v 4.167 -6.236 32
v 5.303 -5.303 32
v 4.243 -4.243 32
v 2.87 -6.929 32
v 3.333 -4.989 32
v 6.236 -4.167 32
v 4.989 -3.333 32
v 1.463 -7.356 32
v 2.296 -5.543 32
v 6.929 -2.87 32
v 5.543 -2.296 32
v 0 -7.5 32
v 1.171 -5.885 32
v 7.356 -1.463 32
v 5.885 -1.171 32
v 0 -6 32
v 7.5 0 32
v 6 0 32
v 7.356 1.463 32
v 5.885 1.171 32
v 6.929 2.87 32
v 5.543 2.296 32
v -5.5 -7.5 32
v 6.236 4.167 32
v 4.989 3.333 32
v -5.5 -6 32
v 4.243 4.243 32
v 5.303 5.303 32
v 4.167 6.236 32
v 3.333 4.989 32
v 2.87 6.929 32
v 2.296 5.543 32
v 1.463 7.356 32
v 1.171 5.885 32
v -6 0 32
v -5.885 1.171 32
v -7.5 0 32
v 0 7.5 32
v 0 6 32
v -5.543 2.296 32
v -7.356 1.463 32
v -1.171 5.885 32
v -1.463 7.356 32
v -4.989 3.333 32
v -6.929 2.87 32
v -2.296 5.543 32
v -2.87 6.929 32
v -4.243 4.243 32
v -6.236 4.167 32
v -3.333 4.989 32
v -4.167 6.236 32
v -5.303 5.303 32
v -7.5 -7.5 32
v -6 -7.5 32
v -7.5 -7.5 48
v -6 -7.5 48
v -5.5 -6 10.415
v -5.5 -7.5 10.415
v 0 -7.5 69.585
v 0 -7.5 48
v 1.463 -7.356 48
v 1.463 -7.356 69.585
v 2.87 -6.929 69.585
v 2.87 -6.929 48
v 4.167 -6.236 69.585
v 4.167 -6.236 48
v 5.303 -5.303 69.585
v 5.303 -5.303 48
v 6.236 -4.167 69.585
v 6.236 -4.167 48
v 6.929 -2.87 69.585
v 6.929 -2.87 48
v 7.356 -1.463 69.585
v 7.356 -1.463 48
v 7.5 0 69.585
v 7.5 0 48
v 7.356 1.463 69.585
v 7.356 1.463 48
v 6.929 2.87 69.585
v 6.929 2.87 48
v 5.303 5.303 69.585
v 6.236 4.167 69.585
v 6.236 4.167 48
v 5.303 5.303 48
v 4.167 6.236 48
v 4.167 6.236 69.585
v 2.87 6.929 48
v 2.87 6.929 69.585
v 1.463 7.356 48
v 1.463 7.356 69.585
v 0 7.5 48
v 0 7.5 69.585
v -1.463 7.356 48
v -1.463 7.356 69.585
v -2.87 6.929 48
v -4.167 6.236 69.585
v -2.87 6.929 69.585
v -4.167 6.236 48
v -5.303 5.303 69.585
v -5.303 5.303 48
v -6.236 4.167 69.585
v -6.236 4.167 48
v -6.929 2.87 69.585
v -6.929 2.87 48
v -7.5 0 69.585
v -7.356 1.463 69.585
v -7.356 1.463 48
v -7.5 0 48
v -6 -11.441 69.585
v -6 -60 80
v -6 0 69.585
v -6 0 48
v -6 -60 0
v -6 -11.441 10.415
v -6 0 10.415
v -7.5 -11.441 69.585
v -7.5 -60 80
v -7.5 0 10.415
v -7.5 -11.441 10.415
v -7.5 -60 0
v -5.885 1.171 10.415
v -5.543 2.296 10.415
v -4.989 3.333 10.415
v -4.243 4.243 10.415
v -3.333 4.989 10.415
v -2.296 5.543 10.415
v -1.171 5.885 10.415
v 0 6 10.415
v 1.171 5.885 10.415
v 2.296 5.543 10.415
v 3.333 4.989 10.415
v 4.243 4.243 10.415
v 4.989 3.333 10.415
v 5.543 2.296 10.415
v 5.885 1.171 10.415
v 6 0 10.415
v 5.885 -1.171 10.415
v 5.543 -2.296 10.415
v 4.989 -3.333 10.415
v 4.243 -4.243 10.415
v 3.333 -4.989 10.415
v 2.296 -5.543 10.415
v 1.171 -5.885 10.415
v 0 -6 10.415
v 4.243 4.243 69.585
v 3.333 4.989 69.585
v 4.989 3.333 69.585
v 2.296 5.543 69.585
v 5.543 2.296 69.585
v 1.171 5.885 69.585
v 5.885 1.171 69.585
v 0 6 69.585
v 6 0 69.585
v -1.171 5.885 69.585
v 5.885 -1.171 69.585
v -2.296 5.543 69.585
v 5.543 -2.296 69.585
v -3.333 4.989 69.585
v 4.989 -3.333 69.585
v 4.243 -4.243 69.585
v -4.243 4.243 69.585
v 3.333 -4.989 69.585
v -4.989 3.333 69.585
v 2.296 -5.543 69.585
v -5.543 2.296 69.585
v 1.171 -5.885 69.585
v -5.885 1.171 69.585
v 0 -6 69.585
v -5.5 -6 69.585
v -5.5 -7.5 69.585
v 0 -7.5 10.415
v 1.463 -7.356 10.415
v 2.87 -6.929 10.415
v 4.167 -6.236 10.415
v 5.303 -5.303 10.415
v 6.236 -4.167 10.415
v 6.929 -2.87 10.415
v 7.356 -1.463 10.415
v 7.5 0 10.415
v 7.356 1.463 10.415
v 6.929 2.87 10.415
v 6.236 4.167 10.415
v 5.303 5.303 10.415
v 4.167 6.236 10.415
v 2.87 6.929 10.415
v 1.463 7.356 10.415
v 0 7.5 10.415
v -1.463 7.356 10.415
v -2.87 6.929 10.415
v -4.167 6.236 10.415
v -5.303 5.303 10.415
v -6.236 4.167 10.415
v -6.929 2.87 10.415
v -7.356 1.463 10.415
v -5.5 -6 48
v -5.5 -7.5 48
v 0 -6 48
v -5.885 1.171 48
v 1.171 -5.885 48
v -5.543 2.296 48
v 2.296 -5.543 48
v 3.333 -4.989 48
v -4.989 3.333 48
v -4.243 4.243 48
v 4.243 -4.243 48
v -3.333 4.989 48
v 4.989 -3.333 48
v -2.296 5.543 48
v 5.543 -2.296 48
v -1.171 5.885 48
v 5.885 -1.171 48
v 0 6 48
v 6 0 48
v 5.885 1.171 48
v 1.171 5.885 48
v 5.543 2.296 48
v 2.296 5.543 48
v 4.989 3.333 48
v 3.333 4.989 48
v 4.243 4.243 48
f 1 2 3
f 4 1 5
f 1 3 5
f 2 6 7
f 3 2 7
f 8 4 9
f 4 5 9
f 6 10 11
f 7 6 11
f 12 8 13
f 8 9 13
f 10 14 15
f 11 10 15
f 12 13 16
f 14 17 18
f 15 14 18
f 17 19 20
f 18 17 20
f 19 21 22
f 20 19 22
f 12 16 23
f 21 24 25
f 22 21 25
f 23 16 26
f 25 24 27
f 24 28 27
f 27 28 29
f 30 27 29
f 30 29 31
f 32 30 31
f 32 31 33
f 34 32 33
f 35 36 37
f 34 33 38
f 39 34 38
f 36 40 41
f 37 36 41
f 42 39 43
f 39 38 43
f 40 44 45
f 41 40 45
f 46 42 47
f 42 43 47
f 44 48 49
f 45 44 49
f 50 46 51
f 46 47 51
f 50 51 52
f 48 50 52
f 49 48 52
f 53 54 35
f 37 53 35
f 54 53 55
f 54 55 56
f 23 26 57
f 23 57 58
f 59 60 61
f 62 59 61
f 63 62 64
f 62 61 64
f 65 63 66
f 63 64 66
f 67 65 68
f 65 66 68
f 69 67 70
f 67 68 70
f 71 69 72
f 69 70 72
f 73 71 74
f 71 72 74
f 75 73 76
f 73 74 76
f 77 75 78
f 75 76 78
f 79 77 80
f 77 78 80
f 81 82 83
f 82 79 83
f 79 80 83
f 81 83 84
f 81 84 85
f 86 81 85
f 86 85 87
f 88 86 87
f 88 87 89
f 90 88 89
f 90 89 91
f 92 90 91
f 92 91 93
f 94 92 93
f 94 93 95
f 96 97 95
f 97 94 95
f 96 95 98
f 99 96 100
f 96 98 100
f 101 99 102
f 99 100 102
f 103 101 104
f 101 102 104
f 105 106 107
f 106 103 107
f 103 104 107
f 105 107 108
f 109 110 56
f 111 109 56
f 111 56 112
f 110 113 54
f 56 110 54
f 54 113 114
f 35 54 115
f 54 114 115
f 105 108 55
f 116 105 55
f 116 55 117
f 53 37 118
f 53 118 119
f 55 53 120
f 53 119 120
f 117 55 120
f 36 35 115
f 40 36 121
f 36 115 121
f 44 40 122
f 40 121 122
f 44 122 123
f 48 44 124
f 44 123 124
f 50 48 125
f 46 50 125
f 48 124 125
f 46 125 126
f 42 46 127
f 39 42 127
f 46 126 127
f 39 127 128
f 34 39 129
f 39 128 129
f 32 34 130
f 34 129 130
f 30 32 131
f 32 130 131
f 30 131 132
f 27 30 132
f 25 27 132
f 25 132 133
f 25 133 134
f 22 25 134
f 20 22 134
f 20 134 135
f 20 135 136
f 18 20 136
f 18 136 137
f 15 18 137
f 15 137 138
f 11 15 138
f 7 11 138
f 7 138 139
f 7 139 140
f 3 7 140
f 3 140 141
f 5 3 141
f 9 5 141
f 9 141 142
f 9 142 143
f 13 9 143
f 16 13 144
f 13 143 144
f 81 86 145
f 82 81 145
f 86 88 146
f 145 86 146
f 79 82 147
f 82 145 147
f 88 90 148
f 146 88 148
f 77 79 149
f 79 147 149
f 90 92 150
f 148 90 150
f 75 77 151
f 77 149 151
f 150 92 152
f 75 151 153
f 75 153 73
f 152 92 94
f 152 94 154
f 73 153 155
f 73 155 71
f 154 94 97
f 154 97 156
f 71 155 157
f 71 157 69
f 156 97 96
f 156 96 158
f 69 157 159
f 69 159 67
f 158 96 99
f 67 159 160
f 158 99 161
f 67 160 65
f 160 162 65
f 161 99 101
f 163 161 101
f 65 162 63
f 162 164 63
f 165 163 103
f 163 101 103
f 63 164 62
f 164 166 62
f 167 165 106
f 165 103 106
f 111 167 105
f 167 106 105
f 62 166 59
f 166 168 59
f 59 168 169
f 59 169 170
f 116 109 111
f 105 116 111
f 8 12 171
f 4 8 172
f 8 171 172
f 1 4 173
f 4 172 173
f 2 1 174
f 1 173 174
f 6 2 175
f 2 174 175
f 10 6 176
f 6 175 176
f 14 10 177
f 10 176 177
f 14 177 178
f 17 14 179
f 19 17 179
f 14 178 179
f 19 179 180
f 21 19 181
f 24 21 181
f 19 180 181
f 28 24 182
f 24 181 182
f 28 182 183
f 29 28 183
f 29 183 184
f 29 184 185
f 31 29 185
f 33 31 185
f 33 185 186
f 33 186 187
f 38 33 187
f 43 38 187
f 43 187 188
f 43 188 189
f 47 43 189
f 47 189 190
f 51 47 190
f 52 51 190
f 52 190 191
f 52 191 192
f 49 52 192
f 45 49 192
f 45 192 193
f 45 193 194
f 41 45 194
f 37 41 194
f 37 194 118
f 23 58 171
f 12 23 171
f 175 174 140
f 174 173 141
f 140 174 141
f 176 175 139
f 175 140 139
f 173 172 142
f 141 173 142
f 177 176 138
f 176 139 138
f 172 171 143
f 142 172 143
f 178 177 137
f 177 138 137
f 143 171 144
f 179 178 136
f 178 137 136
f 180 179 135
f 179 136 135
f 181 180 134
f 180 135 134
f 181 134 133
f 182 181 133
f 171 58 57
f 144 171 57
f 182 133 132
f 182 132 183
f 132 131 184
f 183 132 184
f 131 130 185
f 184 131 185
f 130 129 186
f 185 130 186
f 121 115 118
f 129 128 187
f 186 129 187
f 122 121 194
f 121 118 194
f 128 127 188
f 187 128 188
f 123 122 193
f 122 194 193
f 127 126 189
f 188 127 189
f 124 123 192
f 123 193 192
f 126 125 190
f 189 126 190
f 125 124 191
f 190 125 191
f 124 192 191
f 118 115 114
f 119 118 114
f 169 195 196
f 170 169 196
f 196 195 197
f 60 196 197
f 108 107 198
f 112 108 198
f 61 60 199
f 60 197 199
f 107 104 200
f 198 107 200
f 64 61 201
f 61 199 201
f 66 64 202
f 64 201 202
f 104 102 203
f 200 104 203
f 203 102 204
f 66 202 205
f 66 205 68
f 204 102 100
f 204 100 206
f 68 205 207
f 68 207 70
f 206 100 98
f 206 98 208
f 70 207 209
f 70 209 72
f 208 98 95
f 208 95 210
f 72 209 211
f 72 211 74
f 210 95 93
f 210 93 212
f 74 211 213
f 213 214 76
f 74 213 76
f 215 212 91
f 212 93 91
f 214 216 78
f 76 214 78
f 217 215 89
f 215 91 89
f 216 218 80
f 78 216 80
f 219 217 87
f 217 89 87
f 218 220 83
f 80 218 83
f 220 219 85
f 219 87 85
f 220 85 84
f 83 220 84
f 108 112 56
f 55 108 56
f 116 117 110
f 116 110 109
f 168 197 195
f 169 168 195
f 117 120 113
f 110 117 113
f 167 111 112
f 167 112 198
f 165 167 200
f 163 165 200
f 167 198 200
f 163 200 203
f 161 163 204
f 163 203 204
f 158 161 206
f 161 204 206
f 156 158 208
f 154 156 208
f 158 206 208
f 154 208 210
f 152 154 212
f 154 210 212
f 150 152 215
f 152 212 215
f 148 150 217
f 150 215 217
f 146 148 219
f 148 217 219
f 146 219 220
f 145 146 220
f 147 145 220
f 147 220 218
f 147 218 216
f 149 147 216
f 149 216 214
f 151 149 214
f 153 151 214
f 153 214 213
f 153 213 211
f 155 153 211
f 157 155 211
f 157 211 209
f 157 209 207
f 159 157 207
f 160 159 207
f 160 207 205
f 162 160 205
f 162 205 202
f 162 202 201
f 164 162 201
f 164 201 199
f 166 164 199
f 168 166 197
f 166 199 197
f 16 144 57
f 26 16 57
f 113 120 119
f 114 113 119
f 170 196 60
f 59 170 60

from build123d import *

# Parameters (mm, degrees)
EXTRUDE_1_DEPTH     = 80
CUT_EXTRUDE_1_DEPTH = 7.5
CUT_EXTRUDE_3_DEPTH = 102.118742081


with BuildPart() as part:
    # 草图1 → 凸台-拉伸1 (new body)
    with BuildSketch(Plane.XY):
        with BuildLine():
            Line((-7.5, -60), (-6, -60))
            Line((-6, -60), (-6, 0))
            ThreePointArc((-6, 0), (4.242640687, 4.242640687), (0, -6))
            Line((0, -6), (-5.5, -6))
            Line((-5.5, -6), (-5.5, -7.5))
            Line((-5.5, -7.5), (0, -7.5))
            ThreePointArc((0, -7.5), (5.303300859, 5.303300859), (-7.5, 0))
            Line((-7.5, 0), (-7.5, -60))
        make_face()
    extrude(amount=EXTRUDE_1_DEPTH)

    # 草图3 → 切除-拉伸1 (cut, symmetric)
    with BuildSketch(Plane(origin=(0, 0, 0), x_dir=(1, 0, 0), z_dir=(0, 1, 0))):
        Polygon((7.5, -40), (7.5, -32), (-7.5, -32), (-7.5, -48), (7.5, -48), align=None)
    extrude(amount=CUT_EXTRUDE_1_DEPTH, both=True, mode=Mode.SUBTRACT)

    # 草图5 → 切除-拉伸3 (cut, through all)
    with BuildSketch(Plane.ZY.offset(7.5)):
        Polygon((80, -60), (69.585166332, -11.440975615), (69.585166332, 7.476358761), (69.585166332, 9.692514451), (80, 9.692514451), (80, 7.5), align=None)
        Polygon((10.414833668, -11.440975615), (10.414833668, 7.476358761), (10.414833668, 9.692514451), (0, 9.692514451), (0, 7.5), (0, -60), align=None)
    extrude(amount=-CUT_EXTRUDE_3_DEPTH, mode=Mode.SUBTRACT)


solid = part.part
